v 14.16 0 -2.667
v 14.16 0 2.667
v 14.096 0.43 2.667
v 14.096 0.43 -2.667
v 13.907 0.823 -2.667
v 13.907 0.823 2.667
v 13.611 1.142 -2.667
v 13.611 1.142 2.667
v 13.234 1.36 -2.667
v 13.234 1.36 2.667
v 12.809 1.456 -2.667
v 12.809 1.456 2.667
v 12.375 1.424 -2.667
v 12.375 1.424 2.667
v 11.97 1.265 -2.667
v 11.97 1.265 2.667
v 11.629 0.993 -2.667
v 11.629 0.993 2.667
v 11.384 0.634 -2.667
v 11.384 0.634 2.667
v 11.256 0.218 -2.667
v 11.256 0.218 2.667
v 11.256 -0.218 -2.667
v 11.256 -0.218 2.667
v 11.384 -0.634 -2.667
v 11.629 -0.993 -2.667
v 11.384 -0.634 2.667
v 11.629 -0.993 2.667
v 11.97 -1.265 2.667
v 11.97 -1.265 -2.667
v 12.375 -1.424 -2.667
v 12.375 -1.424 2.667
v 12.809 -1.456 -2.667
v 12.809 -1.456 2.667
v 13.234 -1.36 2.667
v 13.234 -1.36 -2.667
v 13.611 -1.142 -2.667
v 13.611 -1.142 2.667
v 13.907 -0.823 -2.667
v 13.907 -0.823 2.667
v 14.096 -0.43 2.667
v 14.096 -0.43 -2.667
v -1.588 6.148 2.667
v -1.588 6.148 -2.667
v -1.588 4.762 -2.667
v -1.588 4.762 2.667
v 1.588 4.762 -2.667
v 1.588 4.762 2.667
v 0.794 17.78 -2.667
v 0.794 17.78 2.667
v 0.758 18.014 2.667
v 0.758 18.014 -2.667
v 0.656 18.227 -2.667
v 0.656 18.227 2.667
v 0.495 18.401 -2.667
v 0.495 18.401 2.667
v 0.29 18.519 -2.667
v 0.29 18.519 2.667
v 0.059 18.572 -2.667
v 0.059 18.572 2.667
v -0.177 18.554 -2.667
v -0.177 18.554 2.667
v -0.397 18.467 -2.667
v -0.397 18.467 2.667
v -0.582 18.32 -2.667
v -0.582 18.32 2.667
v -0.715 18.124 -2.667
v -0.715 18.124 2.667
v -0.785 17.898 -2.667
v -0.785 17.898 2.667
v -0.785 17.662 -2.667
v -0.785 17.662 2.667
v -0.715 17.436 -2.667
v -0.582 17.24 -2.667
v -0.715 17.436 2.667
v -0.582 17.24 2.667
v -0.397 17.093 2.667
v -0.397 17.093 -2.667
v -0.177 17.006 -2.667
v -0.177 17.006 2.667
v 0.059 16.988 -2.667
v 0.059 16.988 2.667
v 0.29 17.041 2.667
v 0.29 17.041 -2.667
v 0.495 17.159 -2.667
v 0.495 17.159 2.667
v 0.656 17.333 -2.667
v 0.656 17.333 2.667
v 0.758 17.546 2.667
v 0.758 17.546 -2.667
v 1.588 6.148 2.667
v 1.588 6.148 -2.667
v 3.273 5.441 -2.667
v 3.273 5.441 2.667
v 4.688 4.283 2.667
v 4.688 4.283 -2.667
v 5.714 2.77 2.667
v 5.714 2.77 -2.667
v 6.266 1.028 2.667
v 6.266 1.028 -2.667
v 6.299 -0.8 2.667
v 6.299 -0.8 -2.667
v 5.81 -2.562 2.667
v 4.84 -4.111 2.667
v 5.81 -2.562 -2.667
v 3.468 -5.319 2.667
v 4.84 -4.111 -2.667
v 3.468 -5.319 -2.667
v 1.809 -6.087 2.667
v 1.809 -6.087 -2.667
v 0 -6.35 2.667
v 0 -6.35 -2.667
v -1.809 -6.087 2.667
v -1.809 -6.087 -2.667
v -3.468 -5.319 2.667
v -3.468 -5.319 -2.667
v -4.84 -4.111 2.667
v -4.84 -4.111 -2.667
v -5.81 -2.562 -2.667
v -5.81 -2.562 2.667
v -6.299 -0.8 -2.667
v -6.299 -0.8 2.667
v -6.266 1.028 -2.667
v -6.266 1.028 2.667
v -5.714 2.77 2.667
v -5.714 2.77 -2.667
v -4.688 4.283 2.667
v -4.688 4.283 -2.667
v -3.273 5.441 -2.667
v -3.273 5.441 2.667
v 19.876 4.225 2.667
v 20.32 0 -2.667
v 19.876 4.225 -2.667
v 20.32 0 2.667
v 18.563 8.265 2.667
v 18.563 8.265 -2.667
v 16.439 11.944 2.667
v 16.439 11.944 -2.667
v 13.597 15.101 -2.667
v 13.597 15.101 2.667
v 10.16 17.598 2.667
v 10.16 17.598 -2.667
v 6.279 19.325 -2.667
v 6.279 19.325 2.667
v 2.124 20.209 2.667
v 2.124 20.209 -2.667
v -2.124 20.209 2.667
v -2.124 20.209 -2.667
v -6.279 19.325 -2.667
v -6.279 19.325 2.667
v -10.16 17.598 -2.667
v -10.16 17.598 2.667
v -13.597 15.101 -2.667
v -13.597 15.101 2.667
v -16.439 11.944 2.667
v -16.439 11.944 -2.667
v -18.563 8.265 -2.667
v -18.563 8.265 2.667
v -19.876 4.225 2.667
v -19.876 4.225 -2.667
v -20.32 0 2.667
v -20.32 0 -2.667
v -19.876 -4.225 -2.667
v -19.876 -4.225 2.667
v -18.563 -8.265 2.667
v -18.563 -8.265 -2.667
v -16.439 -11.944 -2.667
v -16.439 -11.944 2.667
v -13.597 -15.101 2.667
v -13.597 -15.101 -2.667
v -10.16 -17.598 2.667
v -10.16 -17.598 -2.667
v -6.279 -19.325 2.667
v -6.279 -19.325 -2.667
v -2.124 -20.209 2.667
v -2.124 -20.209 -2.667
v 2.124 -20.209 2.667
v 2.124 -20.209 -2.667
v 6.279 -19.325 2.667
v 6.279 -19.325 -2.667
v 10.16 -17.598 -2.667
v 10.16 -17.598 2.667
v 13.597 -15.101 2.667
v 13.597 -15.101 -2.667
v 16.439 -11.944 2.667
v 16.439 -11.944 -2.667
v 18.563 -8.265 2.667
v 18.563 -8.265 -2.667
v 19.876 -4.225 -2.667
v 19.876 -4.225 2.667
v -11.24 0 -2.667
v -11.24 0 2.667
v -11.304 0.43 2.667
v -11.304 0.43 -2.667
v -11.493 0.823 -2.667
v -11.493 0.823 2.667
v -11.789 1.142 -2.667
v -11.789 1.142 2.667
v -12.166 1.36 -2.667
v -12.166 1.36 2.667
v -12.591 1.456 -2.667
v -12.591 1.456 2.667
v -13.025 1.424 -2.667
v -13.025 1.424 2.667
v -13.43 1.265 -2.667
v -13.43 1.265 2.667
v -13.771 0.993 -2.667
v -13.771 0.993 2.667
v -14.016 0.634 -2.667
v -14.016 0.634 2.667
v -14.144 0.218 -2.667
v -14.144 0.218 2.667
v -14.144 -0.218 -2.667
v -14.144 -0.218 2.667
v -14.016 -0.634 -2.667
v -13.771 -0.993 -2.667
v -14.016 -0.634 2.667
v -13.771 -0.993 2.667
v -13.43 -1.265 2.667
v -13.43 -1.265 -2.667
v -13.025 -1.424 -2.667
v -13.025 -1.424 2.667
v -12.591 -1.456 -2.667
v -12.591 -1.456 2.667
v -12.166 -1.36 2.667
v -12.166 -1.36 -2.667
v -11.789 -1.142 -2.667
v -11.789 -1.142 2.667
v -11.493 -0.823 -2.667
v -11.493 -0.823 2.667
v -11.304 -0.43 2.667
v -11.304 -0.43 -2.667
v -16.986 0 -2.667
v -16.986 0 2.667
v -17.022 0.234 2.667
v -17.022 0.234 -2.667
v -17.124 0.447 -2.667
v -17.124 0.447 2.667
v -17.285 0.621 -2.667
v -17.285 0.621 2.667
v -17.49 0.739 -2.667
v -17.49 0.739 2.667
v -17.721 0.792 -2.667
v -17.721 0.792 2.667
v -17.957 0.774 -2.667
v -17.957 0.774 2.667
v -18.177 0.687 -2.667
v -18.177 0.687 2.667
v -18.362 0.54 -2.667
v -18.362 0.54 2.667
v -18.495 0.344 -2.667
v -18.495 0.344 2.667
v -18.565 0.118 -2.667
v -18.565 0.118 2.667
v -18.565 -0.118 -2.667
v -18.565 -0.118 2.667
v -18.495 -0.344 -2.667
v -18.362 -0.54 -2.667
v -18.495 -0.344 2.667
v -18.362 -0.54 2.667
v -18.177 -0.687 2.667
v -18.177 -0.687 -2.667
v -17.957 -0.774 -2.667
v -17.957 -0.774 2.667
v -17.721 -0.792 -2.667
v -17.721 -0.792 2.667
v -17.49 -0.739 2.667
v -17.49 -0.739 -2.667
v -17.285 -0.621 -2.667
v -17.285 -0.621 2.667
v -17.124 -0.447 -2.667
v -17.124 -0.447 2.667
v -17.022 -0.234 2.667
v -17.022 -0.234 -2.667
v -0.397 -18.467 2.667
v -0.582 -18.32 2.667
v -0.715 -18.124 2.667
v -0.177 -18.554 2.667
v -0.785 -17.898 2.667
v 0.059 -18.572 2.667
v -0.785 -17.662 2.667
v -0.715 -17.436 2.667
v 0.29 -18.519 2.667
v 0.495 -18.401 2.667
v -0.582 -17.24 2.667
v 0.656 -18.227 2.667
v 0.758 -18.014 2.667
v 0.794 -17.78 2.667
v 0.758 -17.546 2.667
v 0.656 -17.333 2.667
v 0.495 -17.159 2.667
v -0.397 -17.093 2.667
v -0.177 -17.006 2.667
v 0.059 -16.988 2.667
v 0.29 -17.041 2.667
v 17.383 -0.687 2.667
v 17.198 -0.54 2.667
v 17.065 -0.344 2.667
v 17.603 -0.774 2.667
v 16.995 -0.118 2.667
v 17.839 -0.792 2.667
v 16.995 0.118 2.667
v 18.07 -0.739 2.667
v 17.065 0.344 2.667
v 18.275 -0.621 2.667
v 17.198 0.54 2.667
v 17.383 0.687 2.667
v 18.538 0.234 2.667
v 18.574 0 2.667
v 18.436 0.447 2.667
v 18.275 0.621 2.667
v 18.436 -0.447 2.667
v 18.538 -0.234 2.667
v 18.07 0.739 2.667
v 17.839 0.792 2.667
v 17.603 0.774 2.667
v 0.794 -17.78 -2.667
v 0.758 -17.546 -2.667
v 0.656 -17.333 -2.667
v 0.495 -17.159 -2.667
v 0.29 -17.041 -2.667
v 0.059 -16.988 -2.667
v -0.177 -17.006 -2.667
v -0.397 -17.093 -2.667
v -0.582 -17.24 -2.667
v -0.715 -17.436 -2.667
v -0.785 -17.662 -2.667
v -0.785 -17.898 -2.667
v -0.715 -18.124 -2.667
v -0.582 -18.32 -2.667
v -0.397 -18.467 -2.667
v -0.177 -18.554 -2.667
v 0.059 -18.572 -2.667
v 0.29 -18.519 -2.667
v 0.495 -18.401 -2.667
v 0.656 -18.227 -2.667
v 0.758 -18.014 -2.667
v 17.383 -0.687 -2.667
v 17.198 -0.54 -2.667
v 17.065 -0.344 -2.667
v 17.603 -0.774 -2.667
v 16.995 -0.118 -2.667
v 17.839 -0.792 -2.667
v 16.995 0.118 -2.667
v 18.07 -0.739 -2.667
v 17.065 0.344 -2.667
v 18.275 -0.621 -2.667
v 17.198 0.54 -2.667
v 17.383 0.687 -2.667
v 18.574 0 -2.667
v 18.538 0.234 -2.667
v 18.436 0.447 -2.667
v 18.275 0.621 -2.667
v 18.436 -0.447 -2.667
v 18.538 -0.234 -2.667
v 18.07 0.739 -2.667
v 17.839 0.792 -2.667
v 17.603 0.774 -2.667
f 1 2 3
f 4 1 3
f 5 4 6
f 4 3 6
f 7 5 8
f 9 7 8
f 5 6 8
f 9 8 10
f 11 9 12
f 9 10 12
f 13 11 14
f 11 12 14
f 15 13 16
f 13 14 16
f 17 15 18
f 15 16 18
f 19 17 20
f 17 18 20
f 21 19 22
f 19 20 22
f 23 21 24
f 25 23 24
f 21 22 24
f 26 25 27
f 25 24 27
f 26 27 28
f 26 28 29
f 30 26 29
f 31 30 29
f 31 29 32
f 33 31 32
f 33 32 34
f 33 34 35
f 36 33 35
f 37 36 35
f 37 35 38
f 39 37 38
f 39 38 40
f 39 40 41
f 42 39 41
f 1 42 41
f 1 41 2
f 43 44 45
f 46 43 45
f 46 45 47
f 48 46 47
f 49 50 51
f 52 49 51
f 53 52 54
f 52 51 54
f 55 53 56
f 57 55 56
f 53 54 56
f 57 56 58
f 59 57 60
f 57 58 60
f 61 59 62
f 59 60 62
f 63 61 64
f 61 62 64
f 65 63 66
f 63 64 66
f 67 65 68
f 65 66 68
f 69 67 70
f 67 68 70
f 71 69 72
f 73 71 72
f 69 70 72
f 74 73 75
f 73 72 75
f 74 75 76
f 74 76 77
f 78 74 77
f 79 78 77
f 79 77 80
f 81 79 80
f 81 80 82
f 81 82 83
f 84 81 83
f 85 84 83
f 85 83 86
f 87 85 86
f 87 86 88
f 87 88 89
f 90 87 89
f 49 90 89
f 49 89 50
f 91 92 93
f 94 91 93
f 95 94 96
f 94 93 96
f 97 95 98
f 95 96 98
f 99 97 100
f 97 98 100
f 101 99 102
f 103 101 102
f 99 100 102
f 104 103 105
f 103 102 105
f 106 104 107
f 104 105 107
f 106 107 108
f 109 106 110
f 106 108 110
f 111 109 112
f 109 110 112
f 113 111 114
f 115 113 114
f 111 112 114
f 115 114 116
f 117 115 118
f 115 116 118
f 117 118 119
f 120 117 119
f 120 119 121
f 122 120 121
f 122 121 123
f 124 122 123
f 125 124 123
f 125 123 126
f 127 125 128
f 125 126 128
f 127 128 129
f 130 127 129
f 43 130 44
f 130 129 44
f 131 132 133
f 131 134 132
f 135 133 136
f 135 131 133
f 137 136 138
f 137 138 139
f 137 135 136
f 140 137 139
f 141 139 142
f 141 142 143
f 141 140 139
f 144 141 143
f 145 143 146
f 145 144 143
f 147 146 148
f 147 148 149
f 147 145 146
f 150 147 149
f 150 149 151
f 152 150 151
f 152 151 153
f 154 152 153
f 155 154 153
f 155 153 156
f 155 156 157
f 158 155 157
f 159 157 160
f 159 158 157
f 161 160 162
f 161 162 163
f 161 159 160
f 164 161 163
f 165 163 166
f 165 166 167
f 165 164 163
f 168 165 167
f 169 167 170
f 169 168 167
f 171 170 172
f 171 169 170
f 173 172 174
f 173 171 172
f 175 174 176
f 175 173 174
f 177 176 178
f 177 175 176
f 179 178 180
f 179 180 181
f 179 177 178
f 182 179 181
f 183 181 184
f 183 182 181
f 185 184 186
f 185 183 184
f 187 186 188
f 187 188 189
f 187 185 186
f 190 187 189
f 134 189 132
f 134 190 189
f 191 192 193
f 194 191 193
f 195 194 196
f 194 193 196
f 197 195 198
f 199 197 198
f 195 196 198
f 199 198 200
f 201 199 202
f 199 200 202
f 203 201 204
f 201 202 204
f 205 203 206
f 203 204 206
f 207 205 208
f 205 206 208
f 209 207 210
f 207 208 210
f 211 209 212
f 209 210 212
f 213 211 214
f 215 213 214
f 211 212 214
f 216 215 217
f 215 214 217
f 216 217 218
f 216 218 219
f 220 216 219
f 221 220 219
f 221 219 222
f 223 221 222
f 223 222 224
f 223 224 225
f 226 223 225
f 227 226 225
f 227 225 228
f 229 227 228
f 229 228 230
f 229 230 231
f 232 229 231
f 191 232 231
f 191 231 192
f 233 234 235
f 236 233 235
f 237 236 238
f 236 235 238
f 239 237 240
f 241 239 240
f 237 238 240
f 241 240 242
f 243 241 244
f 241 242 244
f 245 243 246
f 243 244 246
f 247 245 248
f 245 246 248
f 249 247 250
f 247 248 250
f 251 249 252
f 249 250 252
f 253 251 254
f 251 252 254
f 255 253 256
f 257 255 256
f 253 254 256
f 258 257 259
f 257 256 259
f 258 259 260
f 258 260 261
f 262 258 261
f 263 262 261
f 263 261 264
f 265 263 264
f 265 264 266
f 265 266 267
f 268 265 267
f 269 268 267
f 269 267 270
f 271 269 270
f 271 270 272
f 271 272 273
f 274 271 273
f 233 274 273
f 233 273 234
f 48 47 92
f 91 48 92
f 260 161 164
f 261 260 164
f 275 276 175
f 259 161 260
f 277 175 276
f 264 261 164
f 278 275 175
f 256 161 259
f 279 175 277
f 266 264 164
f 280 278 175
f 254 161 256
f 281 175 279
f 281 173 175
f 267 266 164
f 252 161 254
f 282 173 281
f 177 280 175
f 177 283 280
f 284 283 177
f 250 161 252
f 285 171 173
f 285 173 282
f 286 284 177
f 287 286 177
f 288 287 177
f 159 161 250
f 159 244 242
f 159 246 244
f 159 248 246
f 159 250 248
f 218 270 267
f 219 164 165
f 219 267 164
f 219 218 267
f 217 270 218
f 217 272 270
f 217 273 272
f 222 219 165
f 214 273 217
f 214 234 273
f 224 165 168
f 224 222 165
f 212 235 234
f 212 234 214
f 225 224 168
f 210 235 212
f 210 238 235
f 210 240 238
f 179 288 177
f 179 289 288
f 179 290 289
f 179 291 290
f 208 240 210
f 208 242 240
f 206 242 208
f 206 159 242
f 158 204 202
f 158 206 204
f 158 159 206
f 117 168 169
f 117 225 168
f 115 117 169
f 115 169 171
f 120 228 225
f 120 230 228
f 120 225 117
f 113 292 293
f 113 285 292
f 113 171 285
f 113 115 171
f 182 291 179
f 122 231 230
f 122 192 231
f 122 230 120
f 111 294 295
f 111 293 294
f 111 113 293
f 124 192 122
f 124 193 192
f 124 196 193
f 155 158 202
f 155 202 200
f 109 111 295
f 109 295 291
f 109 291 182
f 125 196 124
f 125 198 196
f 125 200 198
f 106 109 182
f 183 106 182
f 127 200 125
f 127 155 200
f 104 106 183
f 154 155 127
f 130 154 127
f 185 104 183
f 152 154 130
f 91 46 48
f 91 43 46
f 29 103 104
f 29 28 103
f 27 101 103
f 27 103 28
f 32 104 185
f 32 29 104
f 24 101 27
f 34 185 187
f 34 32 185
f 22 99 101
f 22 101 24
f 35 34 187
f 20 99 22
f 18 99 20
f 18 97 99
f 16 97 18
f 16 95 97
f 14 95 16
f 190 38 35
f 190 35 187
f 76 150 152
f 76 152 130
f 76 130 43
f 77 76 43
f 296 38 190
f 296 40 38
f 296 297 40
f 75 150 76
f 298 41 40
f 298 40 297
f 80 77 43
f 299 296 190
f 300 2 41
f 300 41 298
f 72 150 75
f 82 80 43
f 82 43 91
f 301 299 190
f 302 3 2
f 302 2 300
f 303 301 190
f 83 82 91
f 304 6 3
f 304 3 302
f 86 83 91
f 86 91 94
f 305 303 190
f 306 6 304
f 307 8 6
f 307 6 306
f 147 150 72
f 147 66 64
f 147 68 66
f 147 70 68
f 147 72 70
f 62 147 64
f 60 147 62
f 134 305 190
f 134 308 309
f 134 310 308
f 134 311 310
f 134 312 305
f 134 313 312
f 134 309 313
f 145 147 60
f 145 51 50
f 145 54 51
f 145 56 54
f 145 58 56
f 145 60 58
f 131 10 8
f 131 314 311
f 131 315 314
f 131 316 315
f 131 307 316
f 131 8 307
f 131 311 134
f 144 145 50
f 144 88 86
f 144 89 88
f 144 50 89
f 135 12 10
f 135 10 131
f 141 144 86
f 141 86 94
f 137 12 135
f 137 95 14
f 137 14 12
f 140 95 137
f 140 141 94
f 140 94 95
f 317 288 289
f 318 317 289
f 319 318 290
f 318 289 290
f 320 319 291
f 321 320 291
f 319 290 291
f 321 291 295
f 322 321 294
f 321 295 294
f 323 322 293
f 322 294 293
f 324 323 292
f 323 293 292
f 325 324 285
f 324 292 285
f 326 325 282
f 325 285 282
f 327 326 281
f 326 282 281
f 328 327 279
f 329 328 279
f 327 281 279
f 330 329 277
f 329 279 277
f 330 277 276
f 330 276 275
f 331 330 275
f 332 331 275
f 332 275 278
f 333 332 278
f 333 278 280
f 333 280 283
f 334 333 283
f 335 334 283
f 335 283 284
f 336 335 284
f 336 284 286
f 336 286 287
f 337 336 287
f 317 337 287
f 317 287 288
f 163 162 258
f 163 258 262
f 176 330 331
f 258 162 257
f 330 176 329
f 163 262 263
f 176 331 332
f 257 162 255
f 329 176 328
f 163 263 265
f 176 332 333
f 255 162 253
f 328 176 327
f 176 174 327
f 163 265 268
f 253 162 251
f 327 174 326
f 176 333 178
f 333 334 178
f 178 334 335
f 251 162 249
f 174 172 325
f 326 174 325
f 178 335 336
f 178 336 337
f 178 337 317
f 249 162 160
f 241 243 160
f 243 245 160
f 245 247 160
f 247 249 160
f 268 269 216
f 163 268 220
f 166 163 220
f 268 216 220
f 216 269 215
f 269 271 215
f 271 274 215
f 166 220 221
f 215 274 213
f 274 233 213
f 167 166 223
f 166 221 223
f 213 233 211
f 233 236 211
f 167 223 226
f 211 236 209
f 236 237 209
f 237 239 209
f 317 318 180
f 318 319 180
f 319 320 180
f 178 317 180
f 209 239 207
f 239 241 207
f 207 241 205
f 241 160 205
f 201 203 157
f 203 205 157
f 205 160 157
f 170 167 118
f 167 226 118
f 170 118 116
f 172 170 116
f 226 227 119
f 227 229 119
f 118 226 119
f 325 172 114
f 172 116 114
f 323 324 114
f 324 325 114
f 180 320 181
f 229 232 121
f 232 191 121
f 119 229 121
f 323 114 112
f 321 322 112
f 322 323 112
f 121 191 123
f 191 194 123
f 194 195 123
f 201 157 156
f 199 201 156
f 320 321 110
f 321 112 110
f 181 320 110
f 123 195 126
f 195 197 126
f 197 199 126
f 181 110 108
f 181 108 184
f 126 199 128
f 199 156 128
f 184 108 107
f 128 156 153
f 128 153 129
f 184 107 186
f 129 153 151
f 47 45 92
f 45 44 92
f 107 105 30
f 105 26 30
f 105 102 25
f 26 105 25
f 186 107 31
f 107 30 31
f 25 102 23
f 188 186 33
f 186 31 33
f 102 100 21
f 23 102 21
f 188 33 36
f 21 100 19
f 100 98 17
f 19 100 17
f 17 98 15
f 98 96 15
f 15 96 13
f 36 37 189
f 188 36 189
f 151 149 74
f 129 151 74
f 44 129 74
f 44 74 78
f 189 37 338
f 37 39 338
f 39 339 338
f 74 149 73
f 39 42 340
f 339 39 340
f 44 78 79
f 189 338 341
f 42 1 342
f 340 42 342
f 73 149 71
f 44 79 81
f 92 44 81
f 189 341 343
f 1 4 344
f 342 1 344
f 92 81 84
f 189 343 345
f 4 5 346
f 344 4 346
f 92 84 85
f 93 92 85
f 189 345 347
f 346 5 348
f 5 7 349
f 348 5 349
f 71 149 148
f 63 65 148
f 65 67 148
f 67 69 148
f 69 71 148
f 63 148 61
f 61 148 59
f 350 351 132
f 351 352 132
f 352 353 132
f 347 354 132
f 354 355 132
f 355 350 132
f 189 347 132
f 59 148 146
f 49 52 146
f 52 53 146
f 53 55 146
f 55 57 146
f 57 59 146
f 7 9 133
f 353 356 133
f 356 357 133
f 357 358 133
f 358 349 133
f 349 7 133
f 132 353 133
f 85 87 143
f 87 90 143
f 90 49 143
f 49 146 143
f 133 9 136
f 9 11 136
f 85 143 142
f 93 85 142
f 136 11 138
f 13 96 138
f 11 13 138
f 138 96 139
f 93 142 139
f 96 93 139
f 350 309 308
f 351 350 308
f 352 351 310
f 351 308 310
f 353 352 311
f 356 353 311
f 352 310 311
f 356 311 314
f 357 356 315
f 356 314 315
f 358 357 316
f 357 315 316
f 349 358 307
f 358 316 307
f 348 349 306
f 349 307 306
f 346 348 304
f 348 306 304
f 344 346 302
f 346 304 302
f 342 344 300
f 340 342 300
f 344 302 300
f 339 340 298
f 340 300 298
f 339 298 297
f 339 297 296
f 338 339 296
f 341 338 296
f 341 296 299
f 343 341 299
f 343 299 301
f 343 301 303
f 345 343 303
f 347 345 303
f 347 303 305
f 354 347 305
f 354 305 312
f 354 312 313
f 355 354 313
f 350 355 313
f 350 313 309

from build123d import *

# Parameters (mm, degrees)
SKETCH1_R                       = 20.32
SKETCH1_R_2                     = 9.144
BOSS_EXTRUDE1_DEPTH             = 2.667
SKETCH2_R                       = 1.4605
CUT_EXTRUDE1_DEPTH              = 30.227664224
BOSS_EXTRUDE2_REACH             = 30.86
SKETCH3_R                       = 9.525
BOSS_EXTRUDE2_DIRECTION_2_REACH = 30.86
SKETCH4_R                       = 0.79375
CUT_EXTRUDE2_DEPTH              = 30.227664224


with BuildPart() as part:
    # Sketch1 → Boss-Extrude1 (new, symmetric)
    with BuildSketch(Plane.XY):
        Circle(SKETCH1_R)
        Circle(SKETCH1_R_2, mode=Mode.SUBTRACT)
    extrude(amount=BOSS_EXTRUDE1_DEPTH, both=True)

    # Sketch2 → Cut-Extrude1 (cut, through all)
    with BuildSketch(Plane.XY.offset(2.667)):
        with Locations((12.7, 0)):
            Circle(SKETCH2_R)
        with Locations((-12.7, 0)):
            Circle(SKETCH2_R)
    extrude(amount=-CUT_EXTRUDE1_DEPTH, mode=Mode.SUBTRACT)

    # Boss-Extrude2: up to this face of the body (flat: up to its plane)
    boss_extrude2_end = Plane(part.part.faces().sort_by_distance((-19.745263608, 0, 2.667))[0])
    # Sketch3 → Boss-Extrude2 (add, up to the picked face)
    with BuildSketch(Plane.XY, mode=Mode.PRIVATE) as boss_extrude2_sk1:
        Circle(SKETCH3_R)
        with BuildLine():
            Line((-1.5875, 6.148361062), (-1.5875, 4.7625))
            Line((-1.5875, 4.7625), (1.5875, 4.7625))
            Line((1.5875, 4.7625), (1.5875, 6.148361062))
            ThreePointArc((1.5875, 6.148361062), (0, -6.35), (-1.5875, 6.148361062))
        make_face(mode=Mode.SUBTRACT)
    boss_extrude2_tool1 = split(extrude(boss_extrude2_sk1.sketch, amount=BOSS_EXTRUDE2_REACH, mode=Mode.PRIVATE), bisect_by=boss_extrude2_end, keep=Keep.BOTH, mode=Mode.PRIVATE)
    add(boss_extrude2_tool1.solids().sort_by(Axis((-9.255592, 0, 0), (0, 0, 1)))[0])

    # Boss-Extrude2 direction 2: up to this face of the body (flat: up to its plane)
    boss_extrude2_direction_2_end = Plane(part.part.faces().sort_by_distance((-19.745263608, 0, -2.667))[0])
    # Sketch3 → Boss-Extrude2 direction 2 (add, up to the picked face)
    with BuildSketch(Plane.XY, mode=Mode.PRIVATE) as boss_extrude2_direction_2_sk1:
        Circle(SKETCH3_R)
        with BuildLine():
            Line((-1.5875, 6.148361062), (-1.5875, 4.7625))
            Line((-1.5875, 4.7625), (1.5875, 4.7625))
            Line((1.5875, 4.7625), (1.5875, 6.148361062))
            ThreePointArc((1.5875, 6.148361062), (0, -6.35), (-1.5875, 6.148361062))
        make_face(mode=Mode.SUBTRACT)
    boss_extrude2_direction_2_tool1 = split(extrude(boss_extrude2_direction_2_sk1.sketch, amount=-BOSS_EXTRUDE2_DIRECTION_2_REACH, mode=Mode.PRIVATE), bisect_by=boss_extrude2_direction_2_end, keep=Keep.BOTH, mode=Mode.PRIVATE)
    add(boss_extrude2_direction_2_tool1.solids().sort_by(Axis((-9.255592, 0, 0), (0, 0, -1)))[0])

    # Sketch4 → Cut-Extrude2 (cut, through all)
    with BuildSketch(Plane.XY.offset(2.667)):
        with Locations((0, 17.78)):
            Circle(SKETCH4_R)
        with Locations((17.78, 0)):
            Circle(SKETCH4_R)
        with Locations((0, -17.78)):
            Circle(SKETCH4_R)
        with Locations((-17.78, 0)):
            Circle(SKETCH4_R)
    extrude(amount=-CUT_EXTRUDE2_DEPTH, mode=Mode.SUBTRACT)


solid = part.part
